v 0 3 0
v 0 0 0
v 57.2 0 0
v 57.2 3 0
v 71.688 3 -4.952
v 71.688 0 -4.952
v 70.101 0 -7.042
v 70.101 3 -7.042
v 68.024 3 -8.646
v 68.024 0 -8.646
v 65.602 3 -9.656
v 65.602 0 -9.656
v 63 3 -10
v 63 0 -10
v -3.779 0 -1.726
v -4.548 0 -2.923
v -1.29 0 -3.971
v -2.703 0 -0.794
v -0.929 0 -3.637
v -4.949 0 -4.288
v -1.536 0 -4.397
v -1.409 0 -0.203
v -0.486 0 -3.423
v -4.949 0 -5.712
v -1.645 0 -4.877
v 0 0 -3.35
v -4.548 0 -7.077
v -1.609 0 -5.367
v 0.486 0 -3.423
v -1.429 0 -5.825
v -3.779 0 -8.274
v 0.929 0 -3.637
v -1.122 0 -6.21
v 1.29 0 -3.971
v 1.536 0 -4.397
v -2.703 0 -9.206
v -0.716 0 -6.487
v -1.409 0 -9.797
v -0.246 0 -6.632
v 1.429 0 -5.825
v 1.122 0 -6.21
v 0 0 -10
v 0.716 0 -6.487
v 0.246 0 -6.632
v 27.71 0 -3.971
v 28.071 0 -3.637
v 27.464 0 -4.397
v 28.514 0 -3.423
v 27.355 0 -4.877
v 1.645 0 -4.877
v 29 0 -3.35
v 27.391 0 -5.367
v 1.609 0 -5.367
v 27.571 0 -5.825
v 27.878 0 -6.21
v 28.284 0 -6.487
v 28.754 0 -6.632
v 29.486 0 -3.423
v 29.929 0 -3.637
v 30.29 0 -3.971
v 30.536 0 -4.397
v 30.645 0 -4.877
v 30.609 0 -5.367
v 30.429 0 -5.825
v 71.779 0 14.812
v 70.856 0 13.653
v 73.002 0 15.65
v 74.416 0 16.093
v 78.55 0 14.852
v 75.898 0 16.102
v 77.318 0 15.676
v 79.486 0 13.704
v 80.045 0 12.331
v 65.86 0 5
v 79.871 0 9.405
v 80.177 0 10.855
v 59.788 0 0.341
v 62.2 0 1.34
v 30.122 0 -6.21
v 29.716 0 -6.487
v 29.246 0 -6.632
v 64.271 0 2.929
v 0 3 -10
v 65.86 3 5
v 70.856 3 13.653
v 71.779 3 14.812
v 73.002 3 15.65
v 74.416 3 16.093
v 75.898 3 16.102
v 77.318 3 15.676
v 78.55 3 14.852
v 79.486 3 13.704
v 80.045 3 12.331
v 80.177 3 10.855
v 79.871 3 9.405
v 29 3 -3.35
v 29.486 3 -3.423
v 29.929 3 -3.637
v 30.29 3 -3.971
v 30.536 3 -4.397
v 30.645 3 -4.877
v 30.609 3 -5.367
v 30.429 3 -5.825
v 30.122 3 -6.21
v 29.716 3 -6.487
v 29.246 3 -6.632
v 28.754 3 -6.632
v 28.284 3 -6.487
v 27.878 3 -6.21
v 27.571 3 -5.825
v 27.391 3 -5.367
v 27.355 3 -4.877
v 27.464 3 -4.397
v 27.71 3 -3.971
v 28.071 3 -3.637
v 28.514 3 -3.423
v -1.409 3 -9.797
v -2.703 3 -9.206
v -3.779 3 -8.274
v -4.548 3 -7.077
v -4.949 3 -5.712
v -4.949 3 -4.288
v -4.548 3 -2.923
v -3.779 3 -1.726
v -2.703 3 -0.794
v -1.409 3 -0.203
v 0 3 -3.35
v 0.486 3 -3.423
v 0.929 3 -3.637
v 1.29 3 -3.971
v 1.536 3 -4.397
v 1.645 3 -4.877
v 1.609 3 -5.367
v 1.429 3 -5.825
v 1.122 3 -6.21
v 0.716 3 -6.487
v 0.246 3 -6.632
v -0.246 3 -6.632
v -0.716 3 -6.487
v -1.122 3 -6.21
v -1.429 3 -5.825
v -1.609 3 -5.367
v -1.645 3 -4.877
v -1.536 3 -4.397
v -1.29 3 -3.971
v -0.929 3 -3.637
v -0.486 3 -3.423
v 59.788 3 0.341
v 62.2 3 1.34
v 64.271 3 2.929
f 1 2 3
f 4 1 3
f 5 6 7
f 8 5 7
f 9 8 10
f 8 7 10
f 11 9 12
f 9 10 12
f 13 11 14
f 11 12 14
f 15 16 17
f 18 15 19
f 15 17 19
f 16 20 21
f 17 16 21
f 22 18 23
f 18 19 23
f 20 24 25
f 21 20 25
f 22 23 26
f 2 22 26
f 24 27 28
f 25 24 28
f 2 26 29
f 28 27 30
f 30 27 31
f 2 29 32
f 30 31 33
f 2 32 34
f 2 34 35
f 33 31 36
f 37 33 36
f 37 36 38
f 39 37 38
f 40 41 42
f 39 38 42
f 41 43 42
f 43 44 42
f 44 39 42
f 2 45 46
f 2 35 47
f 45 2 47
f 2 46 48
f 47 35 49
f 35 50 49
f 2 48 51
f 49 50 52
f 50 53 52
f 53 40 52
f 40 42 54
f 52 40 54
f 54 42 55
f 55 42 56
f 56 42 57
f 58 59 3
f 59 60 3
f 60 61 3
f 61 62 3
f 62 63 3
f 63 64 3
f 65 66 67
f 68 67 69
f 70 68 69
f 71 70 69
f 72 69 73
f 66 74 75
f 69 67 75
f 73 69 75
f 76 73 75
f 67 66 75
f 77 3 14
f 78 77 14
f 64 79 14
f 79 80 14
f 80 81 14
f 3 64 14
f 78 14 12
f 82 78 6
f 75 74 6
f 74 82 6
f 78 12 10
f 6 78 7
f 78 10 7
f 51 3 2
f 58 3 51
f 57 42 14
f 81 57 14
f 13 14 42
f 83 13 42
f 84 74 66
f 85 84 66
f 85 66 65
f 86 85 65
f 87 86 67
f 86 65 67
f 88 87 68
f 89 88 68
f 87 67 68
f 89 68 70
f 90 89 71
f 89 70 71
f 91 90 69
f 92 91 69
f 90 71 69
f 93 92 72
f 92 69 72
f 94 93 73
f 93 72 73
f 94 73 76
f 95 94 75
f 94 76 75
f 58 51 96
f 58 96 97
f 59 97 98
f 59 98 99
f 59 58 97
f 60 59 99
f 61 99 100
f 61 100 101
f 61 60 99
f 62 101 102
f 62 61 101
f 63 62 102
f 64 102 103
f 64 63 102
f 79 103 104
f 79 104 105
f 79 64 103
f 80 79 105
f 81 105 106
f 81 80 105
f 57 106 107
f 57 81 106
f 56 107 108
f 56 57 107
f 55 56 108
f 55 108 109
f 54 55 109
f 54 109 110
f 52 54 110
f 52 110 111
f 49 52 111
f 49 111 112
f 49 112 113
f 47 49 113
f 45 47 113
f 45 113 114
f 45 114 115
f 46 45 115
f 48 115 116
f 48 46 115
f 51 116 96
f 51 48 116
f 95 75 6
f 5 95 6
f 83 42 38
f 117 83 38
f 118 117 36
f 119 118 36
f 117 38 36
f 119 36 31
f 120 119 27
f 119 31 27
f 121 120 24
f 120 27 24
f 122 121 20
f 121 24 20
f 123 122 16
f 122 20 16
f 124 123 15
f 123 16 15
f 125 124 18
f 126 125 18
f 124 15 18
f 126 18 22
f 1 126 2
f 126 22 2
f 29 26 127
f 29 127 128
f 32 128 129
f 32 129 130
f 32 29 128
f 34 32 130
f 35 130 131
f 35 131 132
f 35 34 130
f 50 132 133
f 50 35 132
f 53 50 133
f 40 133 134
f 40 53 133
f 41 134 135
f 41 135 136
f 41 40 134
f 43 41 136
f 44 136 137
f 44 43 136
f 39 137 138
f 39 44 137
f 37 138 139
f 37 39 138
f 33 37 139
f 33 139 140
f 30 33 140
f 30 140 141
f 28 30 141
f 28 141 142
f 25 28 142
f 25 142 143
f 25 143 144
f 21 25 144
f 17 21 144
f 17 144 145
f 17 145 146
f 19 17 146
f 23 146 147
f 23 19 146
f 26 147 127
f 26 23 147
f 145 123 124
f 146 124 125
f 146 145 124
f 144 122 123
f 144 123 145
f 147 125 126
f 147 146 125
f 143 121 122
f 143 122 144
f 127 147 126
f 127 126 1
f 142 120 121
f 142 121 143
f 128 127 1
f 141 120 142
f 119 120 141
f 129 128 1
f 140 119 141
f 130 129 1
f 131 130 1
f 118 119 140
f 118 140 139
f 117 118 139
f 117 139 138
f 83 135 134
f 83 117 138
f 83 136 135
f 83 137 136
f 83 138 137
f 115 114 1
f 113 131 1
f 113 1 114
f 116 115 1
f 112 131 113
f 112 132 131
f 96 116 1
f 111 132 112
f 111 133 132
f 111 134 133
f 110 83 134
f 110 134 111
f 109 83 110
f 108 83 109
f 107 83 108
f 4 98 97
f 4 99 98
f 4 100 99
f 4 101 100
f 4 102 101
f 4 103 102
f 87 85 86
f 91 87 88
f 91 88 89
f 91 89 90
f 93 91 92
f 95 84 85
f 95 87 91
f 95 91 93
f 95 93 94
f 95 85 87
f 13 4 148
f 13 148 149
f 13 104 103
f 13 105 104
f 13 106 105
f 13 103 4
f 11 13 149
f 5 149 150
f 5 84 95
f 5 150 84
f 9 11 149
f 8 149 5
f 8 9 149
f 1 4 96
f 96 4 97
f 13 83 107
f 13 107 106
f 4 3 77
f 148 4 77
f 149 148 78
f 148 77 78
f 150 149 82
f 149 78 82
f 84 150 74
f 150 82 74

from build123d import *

# Parameters (mm, degrees)
SKETCH_1_R      = 1.65
EXTRUDE_1_DEPTH = 3


with BuildPart() as part:
    # 草图1 → 凸台-拉伸1 (new body)
    with BuildSketch(Plane(origin=(0, 0, 0), x_dir=(1, 0, 0), z_dir=(0, 1, 0))):
        with BuildLine():
            Line((0, 0), (57.2, 0))
            ThreePointArc((57.2, 0), (62.2, -1.339745962), (65.860254038, -5))
            Line((65.860254038, -5), (70.856051038, -13.652974229))
            ThreePointArc((70.856051038, -13.652974229), (77.317543945, -15.675946643), (79.870682341, -9.404998366))
            Line((79.870682341, -9.404998366), (71.687928066, 4.951757862))
            ThreePointArc((71.687928066, 4.951757862), (68.024063165, 8.646316517), (63, 10))
            Line((63, 10), (0, 10))
            ThreePointArc((0, 10), (-5, 5), (0, 0))
        make_face()
        with Locations(Location((0, 5, 0), (0, 0, 270))):
            Circle(SKETCH_1_R, mode=Mode.SUBTRACT)
        with Locations(Location((29, 5, 0), (0, 0, 270))):
            Circle(SKETCH_1_R, mode=Mode.SUBTRACT)
    extrude(amount=EXTRUDE_1_DEPTH)


solid = part.part
